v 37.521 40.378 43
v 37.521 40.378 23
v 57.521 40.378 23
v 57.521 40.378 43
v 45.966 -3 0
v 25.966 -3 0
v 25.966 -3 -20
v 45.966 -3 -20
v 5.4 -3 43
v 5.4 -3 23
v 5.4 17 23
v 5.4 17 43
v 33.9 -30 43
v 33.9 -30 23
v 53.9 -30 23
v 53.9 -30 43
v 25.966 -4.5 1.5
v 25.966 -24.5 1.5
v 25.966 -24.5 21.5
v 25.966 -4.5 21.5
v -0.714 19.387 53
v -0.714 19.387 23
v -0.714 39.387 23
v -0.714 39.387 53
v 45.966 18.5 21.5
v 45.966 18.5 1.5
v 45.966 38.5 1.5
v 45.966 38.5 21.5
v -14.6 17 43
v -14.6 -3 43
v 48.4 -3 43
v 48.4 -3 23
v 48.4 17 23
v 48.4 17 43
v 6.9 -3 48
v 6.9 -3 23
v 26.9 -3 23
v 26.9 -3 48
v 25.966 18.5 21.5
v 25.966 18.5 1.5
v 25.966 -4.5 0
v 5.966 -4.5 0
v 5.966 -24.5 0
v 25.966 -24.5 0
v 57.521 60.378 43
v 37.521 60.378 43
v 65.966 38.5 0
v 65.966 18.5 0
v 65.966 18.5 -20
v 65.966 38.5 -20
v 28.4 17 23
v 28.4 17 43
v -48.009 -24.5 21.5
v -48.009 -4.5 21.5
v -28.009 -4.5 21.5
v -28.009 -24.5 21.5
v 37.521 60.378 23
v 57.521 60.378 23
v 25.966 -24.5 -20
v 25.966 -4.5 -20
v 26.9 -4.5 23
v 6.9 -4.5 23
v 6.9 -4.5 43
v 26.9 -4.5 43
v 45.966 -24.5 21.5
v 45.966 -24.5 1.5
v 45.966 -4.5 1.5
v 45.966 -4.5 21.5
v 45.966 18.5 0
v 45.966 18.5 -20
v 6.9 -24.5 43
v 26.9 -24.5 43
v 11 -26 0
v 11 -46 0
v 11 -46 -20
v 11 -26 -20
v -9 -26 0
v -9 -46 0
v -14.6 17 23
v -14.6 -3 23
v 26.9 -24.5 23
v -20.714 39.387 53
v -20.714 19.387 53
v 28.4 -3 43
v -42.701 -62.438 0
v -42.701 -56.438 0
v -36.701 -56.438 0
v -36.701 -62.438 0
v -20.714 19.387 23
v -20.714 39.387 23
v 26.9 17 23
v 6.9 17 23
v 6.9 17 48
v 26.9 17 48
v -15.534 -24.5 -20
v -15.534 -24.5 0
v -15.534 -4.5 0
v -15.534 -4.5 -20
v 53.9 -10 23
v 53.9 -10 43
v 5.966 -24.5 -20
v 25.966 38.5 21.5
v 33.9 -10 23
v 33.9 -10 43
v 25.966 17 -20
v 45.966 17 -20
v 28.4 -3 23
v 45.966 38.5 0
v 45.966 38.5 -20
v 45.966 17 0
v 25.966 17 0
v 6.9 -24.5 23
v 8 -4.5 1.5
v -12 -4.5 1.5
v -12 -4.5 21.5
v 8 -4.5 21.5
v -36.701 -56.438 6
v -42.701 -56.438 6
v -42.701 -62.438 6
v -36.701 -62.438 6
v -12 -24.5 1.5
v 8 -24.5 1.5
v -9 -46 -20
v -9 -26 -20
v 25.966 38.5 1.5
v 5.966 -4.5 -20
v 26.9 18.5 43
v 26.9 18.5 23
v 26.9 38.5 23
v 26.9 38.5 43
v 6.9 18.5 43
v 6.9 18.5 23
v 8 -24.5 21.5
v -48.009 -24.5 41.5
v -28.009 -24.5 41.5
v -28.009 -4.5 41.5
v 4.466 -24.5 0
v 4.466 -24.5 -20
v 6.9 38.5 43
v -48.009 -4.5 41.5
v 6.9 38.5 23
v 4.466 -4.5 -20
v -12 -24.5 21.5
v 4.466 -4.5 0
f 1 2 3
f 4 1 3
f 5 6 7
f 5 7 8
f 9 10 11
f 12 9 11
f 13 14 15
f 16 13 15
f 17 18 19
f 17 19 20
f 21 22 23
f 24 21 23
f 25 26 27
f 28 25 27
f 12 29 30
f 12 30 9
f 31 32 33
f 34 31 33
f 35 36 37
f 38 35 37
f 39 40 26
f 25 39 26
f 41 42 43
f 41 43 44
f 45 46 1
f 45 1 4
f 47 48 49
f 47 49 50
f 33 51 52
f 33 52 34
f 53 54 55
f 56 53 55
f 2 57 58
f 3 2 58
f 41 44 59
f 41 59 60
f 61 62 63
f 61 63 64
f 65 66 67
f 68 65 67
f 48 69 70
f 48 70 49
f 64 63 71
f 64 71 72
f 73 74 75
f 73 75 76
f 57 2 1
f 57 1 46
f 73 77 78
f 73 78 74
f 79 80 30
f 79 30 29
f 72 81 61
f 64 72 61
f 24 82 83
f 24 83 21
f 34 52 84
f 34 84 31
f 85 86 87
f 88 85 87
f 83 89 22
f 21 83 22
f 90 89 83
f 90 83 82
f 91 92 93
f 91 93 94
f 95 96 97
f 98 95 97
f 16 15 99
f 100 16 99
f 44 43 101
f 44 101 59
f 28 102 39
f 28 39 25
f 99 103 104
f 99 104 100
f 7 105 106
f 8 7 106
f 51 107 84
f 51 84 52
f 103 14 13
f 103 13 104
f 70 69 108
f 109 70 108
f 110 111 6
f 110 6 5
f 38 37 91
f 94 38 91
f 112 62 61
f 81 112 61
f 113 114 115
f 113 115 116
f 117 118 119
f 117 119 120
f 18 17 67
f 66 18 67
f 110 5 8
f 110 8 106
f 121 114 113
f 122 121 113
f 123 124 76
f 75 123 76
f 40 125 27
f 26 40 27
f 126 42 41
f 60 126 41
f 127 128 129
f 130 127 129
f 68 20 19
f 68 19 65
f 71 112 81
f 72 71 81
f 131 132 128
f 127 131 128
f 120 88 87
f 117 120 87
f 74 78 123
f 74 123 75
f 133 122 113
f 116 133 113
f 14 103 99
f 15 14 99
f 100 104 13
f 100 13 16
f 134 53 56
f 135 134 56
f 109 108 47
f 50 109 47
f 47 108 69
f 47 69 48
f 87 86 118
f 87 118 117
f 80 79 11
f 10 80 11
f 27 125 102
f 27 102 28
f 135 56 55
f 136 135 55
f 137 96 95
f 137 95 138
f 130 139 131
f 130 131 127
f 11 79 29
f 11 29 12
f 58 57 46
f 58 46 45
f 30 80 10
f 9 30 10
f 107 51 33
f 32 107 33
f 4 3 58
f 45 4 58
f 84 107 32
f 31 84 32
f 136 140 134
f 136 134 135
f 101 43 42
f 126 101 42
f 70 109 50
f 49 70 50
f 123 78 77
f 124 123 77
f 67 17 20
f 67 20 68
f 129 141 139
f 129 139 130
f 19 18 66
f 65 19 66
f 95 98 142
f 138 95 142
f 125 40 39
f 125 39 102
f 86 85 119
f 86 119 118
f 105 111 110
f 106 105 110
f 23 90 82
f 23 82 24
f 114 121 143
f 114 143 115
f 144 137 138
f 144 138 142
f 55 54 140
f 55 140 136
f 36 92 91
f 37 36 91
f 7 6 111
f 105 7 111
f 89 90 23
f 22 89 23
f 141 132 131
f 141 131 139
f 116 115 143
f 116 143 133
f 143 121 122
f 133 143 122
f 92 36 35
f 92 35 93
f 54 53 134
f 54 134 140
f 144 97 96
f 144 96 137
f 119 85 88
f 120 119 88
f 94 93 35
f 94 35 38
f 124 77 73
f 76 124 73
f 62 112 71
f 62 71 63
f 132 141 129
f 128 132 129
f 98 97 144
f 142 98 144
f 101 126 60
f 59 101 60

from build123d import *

# Parameters (mm, degrees)
F0_W      = 20
F0_H      = 20
F1_DEPTH  = 20
F3_W      = 20
F3_H      = 20
F4_DEPTH  = 20
F6_W      = 20
F6_H      = 20
F7_DEPTH  = 20
F8_DEPTH  = 25
F9_DEPTH  = 20
F10_DEPTH = 30
F11_W     = 6
F11_H     = 6
F12_DEPTH = 6
F13_W     = 20
F13_H     = 20
F14_DEPTH = 20


with BuildPart() as f1:
    # F0 (on Top) → F1 (new body)
    with BuildSketch(Plane.XY):
        with Locations((1, -36)):
            Rectangle(F0_W, F0_H)
    extrude(amount=-F1_DEPTH)


with BuildPart() as f1b:
    # F0 (on Top) → F1, piece 2 (new body)
    with BuildSketch(Plane.XY):
        with Locations((-5.5342707783, -14.5)):
            Rectangle(F0_W, F0_H)
    extrude(amount=-F1_DEPTH)


with BuildPart() as f1c:
    # F0 (on Top) → F1, piece 3 (new body)
    with BuildSketch(Plane.XY):
        with Locations((15.9657292217, -14.5)):
            Rectangle(F0_W, F0_H)
    extrude(amount=-F1_DEPTH)


with BuildPart() as f1d:
    # F0 (on Top) → F1, piece 4 (new body)
    with BuildSketch(Plane.XY):
        with Locations((35.9657292217, 7)):
            Rectangle(F0_W, F0_H)
    extrude(amount=-F1_DEPTH)


with BuildPart() as f1e:
    # F0 (on Top) → F1, piece 5 (new body)
    with BuildSketch(Plane.XY):
        with Locations((55.9657292217, 28.5)):
            Rectangle(F0_W, F0_H)
    extrude(amount=-F1_DEPTH)


with BuildPart() as f4:
    # F3 (on offset) → F4 (new body)
    with BuildSketch(Plane.XY.offset(1.5)):
        with Locations((-2, -14.5)):
            Rectangle(F3_W, F3_H)
    extrude(amount=F4_DEPTH)


with BuildPart() as f4b:
    # F3 (on offset) → F4, piece 2 (new body)
    with BuildSketch(Plane.XY.offset(1.5)):
        with Locations((35.9657292217, -14.5)):
            Rectangle(F3_W, F3_H)
    extrude(amount=F4_DEPTH)


with BuildPart() as f4c:
    # F3 (on offset) → F4, piece 3 (new body)
    with BuildSketch(Plane.XY.offset(1.5)):
        with Locations((35.9657292217, 28.5)):
            Rectangle(F3_W, F3_H)
    extrude(amount=F4_DEPTH)


with BuildPart() as f7:
    # F6 (on offset) → F7 (new body)
    with BuildSketch(Plane.XY.offset(23)):
        with Locations((43.9, -20)):
            Rectangle(F6_W, F6_H)
    extrude(amount=F7_DEPTH)


with BuildPart() as f7b:
    # F6 (on offset) → F7, piece 2 (new body)
    with BuildSketch(Plane.XY.offset(23)):
        with Locations((16.9, -14.5)):
            Rectangle(F6_W, F6_H)
    extrude(amount=F7_DEPTH)


with BuildPart() as f7c:
    # F6 (on offset) → F7, piece 3 (new body)
    with BuildSketch(Plane.XY.offset(23)):
        with Locations((-4.6, 7)):
            Rectangle(F6_W, F6_H)
    extrude(amount=F7_DEPTH)


with BuildPart() as f7d:
    # F6 (on offset) → F7, piece 4 (new body)
    with BuildSketch(Plane.XY.offset(23)):
        with Locations((16.9, 28.5)):
            Rectangle(F6_W, F6_H)
    extrude(amount=F7_DEPTH)


with BuildPart() as f7e:
    # F6 (on offset) → F7, piece 5 (new body)
    with BuildSketch(Plane.XY.offset(23)):
        with Locations((47.5208498538, 50.3779649734)):
            Rectangle(F6_W, F6_H)
    extrude(amount=F7_DEPTH)


with BuildPart() as f8:
    # F6 (on offset) → F8 (new body)
    with BuildSketch(Plane.XY.offset(23)):
        with Locations((16.9, 7)):
            Rectangle(F6_W, F6_H)
    extrude(amount=F8_DEPTH)


with BuildPart() as f9:
    # F6 (on offset) → F9 (new body)
    with BuildSketch(Plane.XY.offset(23)):
        with Locations((38.4, 7)):
            Rectangle(F6_W, F6_H)
    extrude(amount=F9_DEPTH)


with BuildPart() as f10:
    # F6 (on offset) → F10 (new body)
    with BuildSketch(Plane.XY.offset(23)):
        with Locations((-10.7139368774, 29.3868053705)):
            Rectangle(F6_W, F6_H)
    extrude(amount=F10_DEPTH)


with BuildPart() as f12:
    # F11 (on face) → F12 (new body)
    with BuildSketch(Plane.XY):
        with Locations((-39.7010849917, -59.4384841919)):
            Rectangle(F11_W, F11_H)
    extrude(amount=F12_DEPTH)


with BuildPart() as f14:
    # F13 (on face) → F14 (new body)
    with BuildSketch(Plane.XY.offset(21.5)):
        with Locations((-38.0093035775, -14.5)):
            Rectangle(F13_W, F13_H)
    extrude(amount=F14_DEPTH)


solid = Compound([f1.part, f1b.part, f1c.part, f1d.part, f1e.part, f4.part, f4b.part, f4c.part, f7.part, f7b.part, f7c.part, f7d.part, f7e.part, f8.part, f9.part, f10.part, f12.part, f14.part])
